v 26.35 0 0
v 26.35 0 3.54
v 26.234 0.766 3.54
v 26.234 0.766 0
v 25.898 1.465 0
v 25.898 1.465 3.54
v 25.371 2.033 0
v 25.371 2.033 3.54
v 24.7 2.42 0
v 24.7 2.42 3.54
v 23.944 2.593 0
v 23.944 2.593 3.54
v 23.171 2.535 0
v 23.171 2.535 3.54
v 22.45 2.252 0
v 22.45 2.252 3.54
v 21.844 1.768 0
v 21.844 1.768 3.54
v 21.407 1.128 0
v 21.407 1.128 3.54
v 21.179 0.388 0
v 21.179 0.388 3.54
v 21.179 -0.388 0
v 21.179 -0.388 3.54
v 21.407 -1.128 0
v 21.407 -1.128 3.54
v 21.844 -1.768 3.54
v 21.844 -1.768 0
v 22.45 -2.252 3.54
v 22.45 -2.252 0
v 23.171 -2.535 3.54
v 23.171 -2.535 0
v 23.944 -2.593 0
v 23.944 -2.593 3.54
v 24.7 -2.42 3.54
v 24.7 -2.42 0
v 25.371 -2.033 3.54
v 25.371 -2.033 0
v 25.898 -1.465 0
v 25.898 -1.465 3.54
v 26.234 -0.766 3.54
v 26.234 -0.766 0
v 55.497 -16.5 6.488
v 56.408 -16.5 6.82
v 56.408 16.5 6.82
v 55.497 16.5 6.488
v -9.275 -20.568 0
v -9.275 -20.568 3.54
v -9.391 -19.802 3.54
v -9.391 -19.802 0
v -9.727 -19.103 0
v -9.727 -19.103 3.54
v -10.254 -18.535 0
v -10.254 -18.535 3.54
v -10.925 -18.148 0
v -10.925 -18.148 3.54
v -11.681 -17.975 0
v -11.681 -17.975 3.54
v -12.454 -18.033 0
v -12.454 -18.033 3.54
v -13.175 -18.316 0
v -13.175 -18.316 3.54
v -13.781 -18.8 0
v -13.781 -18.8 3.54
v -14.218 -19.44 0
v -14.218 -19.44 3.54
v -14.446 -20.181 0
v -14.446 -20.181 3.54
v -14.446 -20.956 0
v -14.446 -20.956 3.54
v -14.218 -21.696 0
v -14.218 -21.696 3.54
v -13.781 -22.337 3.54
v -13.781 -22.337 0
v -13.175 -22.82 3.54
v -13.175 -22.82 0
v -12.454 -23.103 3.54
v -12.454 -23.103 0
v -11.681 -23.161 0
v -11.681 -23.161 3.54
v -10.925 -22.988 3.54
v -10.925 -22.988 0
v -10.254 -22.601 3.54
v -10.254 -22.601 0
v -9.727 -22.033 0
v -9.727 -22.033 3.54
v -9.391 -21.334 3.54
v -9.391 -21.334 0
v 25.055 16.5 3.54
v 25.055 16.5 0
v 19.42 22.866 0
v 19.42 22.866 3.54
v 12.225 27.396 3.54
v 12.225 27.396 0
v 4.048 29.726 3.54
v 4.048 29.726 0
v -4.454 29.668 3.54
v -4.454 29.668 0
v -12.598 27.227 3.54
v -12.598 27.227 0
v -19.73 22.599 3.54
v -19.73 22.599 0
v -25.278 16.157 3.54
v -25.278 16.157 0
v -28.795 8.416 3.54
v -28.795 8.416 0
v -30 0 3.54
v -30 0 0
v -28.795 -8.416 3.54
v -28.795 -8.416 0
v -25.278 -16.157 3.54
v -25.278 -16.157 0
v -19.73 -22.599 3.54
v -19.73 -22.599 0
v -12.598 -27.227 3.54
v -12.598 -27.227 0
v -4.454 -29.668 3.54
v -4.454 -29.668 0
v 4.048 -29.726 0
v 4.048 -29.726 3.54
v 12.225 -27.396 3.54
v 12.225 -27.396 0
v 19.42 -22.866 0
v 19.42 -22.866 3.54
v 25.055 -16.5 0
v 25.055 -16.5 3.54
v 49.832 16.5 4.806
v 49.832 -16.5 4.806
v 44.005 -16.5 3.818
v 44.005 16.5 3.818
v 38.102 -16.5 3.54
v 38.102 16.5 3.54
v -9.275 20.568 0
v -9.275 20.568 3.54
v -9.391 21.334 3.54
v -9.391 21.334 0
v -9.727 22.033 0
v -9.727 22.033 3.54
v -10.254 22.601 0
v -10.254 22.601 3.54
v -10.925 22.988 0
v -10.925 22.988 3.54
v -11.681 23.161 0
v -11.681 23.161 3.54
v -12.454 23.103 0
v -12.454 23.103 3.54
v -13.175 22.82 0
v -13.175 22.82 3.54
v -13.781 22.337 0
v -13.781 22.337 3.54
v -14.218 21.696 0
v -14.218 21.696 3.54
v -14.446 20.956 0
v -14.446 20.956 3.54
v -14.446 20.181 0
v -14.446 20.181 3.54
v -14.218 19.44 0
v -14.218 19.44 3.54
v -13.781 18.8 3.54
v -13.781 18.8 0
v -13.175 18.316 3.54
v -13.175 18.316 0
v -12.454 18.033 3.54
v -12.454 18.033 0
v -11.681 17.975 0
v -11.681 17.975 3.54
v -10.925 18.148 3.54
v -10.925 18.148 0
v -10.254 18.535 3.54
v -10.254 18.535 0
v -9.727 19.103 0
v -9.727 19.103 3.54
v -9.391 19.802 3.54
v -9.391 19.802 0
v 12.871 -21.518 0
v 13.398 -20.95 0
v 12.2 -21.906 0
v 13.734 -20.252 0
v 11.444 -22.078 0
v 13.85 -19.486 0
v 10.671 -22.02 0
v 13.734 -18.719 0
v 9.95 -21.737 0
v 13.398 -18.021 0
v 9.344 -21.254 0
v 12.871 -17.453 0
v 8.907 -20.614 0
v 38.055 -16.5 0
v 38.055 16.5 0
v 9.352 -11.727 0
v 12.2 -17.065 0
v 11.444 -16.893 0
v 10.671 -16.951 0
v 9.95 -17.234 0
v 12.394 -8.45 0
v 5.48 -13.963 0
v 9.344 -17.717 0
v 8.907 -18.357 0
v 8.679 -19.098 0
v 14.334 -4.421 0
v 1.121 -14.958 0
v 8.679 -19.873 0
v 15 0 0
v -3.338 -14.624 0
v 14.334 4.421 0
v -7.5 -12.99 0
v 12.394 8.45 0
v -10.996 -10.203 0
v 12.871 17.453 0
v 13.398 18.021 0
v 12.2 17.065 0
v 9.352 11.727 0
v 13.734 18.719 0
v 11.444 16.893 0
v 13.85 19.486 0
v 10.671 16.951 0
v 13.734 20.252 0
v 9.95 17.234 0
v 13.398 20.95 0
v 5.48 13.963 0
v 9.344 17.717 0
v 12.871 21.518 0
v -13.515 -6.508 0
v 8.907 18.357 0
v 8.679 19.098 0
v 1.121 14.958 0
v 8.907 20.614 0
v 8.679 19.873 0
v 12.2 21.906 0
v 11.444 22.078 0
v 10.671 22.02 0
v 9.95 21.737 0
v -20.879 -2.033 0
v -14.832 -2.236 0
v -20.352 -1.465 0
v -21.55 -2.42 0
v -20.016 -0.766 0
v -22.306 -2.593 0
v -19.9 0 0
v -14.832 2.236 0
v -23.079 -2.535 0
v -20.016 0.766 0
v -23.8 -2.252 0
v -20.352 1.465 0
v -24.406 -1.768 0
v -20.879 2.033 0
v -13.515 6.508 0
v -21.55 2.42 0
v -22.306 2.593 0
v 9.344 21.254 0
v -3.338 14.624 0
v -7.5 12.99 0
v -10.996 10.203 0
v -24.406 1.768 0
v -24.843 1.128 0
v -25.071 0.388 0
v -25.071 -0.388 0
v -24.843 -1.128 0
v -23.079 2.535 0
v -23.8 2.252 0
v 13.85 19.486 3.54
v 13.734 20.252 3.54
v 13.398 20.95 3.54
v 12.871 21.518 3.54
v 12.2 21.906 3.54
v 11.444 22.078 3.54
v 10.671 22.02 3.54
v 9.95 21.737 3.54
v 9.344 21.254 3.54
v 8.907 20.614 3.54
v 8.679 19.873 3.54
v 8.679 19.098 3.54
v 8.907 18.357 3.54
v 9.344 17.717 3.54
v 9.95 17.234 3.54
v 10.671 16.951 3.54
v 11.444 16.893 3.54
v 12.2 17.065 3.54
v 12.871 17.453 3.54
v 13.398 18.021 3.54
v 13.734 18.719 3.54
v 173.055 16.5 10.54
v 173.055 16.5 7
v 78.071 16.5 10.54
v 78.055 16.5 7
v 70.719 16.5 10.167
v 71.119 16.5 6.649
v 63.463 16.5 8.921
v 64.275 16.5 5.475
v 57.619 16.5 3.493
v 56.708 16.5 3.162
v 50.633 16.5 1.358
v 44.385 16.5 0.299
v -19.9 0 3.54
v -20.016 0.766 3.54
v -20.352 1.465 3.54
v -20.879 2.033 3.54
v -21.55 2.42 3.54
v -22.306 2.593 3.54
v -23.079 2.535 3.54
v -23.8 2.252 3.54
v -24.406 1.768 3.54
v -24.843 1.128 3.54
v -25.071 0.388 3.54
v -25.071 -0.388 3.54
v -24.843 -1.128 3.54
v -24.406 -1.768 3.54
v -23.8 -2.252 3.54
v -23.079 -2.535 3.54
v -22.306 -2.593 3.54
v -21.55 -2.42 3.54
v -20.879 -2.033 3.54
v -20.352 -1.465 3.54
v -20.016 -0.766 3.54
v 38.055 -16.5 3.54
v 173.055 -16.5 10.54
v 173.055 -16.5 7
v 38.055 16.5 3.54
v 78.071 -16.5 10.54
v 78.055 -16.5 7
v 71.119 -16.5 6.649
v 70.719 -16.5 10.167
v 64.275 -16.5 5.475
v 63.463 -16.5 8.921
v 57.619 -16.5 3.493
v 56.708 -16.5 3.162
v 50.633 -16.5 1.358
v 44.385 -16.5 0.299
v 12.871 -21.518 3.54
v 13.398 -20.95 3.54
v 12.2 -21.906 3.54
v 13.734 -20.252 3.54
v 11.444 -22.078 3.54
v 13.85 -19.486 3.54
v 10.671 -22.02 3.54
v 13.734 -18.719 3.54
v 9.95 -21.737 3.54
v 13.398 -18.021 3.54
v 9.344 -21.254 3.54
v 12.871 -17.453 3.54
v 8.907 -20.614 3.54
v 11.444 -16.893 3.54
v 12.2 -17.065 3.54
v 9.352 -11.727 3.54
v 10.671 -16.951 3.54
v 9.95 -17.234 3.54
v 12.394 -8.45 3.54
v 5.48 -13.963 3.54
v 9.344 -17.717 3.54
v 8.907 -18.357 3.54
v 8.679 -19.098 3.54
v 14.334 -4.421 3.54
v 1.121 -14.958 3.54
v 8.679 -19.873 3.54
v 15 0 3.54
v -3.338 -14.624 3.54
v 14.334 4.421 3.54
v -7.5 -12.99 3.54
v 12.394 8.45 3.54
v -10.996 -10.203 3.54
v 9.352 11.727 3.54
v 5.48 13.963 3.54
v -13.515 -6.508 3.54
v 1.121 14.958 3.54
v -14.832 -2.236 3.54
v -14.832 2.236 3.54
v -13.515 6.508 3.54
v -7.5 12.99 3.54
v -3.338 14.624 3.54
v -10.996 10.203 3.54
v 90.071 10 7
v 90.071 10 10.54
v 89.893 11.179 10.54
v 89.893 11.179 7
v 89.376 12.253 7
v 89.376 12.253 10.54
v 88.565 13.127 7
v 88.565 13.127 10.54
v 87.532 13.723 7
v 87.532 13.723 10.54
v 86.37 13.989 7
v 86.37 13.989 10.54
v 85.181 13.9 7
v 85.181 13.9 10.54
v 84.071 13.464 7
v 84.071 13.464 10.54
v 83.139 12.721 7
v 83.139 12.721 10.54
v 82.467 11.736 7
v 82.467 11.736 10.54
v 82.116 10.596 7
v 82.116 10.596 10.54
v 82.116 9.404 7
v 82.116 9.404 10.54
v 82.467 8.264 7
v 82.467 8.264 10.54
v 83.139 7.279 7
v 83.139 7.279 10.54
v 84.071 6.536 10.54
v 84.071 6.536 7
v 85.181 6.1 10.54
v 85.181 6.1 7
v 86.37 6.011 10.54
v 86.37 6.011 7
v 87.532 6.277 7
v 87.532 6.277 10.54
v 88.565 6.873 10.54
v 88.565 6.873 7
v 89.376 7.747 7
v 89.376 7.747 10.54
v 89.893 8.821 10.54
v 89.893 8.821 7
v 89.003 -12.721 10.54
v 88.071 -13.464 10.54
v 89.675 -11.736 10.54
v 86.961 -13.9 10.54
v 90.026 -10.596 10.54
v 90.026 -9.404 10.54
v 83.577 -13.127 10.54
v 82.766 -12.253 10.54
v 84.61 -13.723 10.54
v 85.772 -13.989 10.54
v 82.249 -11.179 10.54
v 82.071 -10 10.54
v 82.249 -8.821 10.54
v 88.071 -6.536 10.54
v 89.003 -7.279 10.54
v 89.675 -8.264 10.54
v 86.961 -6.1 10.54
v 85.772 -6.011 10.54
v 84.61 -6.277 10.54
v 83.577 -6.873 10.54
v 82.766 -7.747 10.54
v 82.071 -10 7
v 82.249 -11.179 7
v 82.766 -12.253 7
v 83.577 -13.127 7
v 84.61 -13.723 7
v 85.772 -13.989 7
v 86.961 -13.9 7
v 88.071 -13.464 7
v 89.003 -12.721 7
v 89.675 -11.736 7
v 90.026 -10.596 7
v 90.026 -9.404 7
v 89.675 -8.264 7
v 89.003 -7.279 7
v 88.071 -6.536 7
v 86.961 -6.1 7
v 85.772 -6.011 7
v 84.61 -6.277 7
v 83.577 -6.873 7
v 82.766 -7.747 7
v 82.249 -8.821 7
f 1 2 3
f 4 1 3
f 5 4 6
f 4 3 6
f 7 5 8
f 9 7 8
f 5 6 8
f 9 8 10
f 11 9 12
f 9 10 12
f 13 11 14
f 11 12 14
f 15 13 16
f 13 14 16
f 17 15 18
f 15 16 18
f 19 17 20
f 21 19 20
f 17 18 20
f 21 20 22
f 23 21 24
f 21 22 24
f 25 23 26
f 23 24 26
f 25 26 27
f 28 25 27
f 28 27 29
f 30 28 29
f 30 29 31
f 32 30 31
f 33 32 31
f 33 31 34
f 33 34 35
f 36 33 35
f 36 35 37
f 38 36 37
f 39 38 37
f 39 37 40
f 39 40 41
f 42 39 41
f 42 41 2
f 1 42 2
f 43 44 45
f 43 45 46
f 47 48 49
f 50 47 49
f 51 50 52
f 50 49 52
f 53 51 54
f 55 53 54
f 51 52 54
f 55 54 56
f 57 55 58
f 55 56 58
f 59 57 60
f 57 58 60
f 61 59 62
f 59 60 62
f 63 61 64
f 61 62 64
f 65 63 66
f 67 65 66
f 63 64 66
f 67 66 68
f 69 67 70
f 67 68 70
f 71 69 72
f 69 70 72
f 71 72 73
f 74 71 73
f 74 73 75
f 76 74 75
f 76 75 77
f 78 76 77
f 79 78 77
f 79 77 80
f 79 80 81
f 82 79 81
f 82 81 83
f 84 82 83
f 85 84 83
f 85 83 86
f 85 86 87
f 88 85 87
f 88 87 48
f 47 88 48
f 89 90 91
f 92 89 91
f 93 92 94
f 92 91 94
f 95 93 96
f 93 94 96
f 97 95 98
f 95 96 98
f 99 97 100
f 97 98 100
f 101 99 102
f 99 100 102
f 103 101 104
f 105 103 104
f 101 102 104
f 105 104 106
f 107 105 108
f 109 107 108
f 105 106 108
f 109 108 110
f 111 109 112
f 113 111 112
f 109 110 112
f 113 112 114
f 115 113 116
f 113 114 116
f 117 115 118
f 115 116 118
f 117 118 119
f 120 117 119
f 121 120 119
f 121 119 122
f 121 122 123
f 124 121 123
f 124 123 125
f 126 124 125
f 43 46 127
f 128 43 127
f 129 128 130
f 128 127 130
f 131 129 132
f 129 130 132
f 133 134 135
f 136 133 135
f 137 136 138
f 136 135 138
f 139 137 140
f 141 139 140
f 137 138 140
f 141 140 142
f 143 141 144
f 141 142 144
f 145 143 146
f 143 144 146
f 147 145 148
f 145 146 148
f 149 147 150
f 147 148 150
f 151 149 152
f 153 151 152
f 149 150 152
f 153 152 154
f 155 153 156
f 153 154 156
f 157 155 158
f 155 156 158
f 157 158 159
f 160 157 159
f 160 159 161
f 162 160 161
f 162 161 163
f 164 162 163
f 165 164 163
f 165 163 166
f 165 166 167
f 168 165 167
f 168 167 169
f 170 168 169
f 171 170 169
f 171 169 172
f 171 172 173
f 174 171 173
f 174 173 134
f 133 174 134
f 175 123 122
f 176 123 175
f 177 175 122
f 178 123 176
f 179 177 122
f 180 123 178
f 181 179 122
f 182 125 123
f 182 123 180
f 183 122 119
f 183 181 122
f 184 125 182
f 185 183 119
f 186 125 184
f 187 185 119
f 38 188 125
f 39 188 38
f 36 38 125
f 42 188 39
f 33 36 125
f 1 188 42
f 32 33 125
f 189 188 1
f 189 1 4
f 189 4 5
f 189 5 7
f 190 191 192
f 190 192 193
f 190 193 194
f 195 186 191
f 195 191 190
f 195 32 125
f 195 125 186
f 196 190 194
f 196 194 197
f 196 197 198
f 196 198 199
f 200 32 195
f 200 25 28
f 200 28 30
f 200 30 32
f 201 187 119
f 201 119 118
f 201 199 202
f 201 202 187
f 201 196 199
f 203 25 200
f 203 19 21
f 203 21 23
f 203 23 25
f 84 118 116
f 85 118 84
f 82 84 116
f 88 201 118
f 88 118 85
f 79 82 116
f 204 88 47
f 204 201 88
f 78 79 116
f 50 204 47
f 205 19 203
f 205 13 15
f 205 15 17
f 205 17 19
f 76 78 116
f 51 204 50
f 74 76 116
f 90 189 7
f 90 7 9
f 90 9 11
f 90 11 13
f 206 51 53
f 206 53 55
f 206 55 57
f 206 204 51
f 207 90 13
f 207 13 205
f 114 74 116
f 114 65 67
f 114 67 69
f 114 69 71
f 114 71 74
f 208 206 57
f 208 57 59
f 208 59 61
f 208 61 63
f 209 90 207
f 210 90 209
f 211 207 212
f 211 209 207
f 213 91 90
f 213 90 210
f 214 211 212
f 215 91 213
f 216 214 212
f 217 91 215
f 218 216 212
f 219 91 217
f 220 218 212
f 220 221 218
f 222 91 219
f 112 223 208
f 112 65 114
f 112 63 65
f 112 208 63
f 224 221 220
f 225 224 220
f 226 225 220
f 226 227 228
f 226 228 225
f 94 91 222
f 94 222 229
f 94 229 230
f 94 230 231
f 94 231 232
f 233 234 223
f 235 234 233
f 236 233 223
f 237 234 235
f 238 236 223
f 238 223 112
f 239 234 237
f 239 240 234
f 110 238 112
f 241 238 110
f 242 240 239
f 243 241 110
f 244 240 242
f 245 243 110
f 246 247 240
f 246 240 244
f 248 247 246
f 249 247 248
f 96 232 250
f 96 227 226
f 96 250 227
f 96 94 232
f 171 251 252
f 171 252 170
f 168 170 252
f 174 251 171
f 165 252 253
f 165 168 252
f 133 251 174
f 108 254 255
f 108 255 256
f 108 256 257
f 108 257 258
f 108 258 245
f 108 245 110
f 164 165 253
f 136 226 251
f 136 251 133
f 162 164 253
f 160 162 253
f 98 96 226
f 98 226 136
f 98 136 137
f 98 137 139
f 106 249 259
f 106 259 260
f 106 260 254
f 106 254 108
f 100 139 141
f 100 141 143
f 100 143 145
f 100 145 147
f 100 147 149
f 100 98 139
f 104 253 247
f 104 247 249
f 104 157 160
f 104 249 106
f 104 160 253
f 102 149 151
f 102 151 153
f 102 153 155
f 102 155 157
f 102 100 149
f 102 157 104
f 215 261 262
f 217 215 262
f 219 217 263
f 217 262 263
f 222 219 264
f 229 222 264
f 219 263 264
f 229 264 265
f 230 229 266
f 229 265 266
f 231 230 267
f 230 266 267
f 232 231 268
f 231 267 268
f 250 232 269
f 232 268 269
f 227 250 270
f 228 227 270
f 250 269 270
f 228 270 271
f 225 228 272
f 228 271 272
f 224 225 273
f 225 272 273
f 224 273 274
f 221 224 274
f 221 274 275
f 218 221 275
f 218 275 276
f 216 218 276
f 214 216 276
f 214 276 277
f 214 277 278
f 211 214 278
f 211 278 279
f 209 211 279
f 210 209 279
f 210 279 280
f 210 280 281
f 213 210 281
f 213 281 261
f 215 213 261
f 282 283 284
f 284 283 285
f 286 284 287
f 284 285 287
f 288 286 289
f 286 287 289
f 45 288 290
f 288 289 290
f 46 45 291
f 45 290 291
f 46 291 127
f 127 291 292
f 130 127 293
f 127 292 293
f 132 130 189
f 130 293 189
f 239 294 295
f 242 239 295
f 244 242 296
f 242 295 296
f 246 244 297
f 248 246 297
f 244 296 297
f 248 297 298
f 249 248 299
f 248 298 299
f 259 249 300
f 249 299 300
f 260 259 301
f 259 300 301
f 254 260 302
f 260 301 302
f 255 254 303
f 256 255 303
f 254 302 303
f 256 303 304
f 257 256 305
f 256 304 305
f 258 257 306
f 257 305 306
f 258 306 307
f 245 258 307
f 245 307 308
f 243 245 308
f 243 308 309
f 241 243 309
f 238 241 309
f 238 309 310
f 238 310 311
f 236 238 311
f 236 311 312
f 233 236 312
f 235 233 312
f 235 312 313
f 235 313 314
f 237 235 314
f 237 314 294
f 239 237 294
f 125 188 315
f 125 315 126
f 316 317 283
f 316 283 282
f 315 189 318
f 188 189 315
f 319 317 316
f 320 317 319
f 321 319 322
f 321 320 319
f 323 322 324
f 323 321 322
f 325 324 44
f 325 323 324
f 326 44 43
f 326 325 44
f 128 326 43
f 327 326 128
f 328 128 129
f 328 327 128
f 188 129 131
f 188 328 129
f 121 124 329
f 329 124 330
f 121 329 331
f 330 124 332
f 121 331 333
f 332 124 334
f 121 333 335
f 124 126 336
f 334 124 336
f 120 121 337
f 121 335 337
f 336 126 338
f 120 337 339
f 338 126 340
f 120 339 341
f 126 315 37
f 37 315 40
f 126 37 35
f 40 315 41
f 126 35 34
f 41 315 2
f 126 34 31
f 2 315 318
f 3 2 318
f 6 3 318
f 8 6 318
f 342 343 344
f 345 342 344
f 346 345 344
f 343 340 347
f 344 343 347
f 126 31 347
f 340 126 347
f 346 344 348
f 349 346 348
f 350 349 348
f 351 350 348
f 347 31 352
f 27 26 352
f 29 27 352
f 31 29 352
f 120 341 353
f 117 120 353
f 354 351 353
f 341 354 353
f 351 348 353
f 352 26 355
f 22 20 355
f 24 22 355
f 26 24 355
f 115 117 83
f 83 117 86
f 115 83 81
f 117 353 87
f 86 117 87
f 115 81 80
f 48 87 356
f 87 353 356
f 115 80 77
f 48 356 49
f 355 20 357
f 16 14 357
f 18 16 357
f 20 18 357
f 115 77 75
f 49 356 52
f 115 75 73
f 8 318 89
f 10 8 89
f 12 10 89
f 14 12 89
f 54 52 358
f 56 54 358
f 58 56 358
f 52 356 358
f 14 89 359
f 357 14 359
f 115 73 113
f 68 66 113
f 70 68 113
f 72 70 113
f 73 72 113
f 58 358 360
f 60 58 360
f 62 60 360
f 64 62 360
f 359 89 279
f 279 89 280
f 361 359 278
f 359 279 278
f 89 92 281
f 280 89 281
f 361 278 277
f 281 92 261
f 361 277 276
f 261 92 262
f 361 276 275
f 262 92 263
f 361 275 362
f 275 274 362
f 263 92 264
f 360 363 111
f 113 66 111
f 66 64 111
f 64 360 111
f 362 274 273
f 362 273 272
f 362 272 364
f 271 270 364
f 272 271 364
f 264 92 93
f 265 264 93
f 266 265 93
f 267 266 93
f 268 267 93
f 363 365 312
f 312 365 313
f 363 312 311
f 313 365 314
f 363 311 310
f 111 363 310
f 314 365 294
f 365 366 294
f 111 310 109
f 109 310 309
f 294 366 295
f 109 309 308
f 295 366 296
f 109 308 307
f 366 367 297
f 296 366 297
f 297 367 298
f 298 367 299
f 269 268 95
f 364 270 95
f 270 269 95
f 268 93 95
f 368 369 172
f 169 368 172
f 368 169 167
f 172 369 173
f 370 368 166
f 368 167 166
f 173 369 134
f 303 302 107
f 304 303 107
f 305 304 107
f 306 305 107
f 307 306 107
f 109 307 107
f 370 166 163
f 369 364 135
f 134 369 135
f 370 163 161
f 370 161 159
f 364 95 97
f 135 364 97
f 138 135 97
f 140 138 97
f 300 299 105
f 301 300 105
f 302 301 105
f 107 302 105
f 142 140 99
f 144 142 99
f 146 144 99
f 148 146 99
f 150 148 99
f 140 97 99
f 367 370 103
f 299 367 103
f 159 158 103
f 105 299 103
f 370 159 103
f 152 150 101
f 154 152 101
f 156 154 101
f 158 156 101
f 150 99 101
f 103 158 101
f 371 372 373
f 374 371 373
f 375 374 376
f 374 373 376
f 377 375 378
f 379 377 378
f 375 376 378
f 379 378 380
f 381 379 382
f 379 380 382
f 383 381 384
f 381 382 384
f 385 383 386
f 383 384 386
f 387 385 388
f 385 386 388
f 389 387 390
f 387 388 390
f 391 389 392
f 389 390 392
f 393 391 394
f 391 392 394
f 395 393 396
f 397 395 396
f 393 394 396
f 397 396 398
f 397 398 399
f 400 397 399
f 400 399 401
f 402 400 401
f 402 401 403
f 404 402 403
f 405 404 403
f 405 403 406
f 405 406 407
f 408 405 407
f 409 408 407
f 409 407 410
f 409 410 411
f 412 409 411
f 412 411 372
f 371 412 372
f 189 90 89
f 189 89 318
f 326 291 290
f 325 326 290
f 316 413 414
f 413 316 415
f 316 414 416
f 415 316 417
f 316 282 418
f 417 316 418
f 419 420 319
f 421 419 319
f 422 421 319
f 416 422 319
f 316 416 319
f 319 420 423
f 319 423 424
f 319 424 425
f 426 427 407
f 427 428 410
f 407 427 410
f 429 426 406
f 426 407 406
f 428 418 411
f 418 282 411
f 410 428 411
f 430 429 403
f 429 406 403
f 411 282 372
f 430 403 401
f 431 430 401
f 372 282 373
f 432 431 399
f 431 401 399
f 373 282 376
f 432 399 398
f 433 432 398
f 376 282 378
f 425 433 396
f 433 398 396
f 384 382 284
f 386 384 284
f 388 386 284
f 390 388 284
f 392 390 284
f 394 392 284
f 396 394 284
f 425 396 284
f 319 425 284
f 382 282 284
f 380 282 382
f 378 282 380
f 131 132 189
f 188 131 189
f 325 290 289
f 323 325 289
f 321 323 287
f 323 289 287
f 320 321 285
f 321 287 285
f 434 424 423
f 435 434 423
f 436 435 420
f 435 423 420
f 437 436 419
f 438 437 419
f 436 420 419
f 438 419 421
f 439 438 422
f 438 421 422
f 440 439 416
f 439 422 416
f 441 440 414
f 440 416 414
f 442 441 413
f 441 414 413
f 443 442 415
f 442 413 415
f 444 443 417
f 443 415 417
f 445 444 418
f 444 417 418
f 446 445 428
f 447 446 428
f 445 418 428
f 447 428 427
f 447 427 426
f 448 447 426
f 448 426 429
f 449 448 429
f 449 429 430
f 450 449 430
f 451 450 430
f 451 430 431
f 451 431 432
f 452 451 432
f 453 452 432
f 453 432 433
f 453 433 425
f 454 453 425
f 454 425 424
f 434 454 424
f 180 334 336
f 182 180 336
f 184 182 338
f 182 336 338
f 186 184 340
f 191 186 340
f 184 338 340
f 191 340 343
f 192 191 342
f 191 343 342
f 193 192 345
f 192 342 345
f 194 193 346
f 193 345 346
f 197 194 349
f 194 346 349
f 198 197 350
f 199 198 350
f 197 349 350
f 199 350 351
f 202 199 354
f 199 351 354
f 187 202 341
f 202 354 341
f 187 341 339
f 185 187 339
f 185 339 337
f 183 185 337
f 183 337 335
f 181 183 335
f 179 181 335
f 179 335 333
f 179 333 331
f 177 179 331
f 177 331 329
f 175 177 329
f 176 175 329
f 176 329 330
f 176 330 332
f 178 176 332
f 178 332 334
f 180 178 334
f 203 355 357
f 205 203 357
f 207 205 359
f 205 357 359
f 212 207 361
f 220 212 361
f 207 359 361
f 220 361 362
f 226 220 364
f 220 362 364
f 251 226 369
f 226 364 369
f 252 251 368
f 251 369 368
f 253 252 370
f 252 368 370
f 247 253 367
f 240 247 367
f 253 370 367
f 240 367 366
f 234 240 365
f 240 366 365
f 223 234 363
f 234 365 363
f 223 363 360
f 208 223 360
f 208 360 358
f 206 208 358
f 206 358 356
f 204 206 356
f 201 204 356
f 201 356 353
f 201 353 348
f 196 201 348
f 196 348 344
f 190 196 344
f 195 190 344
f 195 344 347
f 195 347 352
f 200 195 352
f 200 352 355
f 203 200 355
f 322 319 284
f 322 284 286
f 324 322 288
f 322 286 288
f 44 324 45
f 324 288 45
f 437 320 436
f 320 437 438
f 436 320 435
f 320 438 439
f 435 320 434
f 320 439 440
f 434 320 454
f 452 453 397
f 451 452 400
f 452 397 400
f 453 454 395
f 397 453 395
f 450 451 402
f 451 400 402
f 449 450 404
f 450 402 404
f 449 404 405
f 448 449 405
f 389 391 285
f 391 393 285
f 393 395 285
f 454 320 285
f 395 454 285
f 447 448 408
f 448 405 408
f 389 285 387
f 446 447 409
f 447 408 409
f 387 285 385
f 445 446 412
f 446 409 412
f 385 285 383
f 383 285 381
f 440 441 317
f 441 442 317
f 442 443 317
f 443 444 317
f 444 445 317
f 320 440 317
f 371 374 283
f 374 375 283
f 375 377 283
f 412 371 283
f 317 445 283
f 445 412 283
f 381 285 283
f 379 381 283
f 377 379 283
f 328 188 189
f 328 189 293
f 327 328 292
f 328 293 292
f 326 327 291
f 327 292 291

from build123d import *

# Parameters (mm, degrees)
SKETCH1_R           = 30
BOSS_EXTRUDE1_DEPTH = 3.54
BOSS_EXTRUDE4_START = -3.54
BOSS_EXTRUDE4_DEPTH = 3.54
CUT_EXTRUDE1_REACH  = 50.587
SKETCH5_R           = 15
CUT_EXTRUDE2_REACH  = 50.587
SKETCH6_R           = 2.6
BOSS_EXTRUDE5_DEPTH = 33
SKETCH8_R           = 4
CUT_EXTRUDE3_DEPTH  = 10


with BuildPart() as part:
    # Sketch1 → Boss-Extrude1 (new body)
    with BuildSketch(Plane.XY):
        Circle(SKETCH1_R)
    extrude(amount=BOSS_EXTRUDE1_DEPTH)

    # Sketch4 → Boss-Extrude4 (add)
    with BuildSketch(Plane.XY.offset(3.54).offset(BOSS_EXTRUDE4_START)):
        with BuildLine():
            Line((25.054939633, 16.5), (38.054939633, 16.5))
            Line((38.054939633, 16.5), (38.054939633, -16.5))
            Line((38.054939633, -16.5), (25.054939633, -16.5))
            ThreePointArc((25.054939633, -16.5), (30, 0), (25.054939633, 16.5))
        make_face()
    extrude(amount=BOSS_EXTRUDE4_DEPTH)

    # Sketch5 → Cut-Extrude1 (cut, up to next)
    with BuildSketch(Plane.XY.offset(3.54), mode=Mode.PRIVATE) as cut_extrude1_sk1:
        Circle(SKETCH5_R)
    cut_extrude1_tool1 = extrude(cut_extrude1_sk1.sketch, amount=-CUT_EXTRUDE1_REACH, mode=Mode.PRIVATE) & part.part
    add(cut_extrude1_tool1.solids().sort_by_distance((0, 0, 3.54))[0], mode=Mode.SUBTRACT)

    # Sketch6 → Cut-Extrude2 (cut, up to next)
    with BuildSketch(Plane.XY.offset(3.54), mode=Mode.PRIVATE) as cut_extrude2_sk1:
        with Locations((-22.5, 0)):
            Circle(SKETCH6_R)
    cut_extrude2_tool1 = extrude(cut_extrude2_sk1.sketch, amount=-CUT_EXTRUDE2_REACH, mode=Mode.PRIVATE) & part.part
    # Sketch6 → Cut-Extrude2 (cut, up to next)
    with BuildSketch(Plane.XY.offset(3.54), mode=Mode.PRIVATE) as cut_extrude2_sk2:
        with Locations((11.25, 19.485571585)):
            Circle(SKETCH6_R)
    cut_extrude2_tool2 = extrude(cut_extrude2_sk2.sketch, amount=-CUT_EXTRUDE2_REACH, mode=Mode.PRIVATE) & part.part
    # Sketch6 → Cut-Extrude2 (cut, up to next)
    with BuildSketch(Plane.XY.offset(3.54), mode=Mode.PRIVATE) as cut_extrude2_sk3:
        with Locations((11.25, -19.485571585)):
            Circle(SKETCH6_R)
    cut_extrude2_tool3 = extrude(cut_extrude2_sk3.sketch, amount=-CUT_EXTRUDE2_REACH, mode=Mode.PRIVATE) & part.part
    # Sketch6 → Cut-Extrude2 (cut, up to next)
    with BuildSketch(Plane.XY.offset(3.54), mode=Mode.PRIVATE) as cut_extrude2_sk4:
        with Locations((23.75, 0)):
            Circle(SKETCH6_R)
    cut_extrude2_tool4 = extrude(cut_extrude2_sk4.sketch, amount=-CUT_EXTRUDE2_REACH, mode=Mode.PRIVATE) & part.part
    # Sketch6 → Cut-Extrude2 (cut, up to next)
    with BuildSketch(Plane.XY.offset(3.54), mode=Mode.PRIVATE) as cut_extrude2_sk5:
        with Locations((-11.875, -20.56810334)):
            Circle(SKETCH6_R)
    cut_extrude2_tool5 = extrude(cut_extrude2_sk5.sketch, amount=-CUT_EXTRUDE2_REACH, mode=Mode.PRIVATE) & part.part
    # Sketch6 → Cut-Extrude2 (cut, up to next)
    with BuildSketch(Plane.XY.offset(3.54), mode=Mode.PRIVATE) as cut_extrude2_sk6:
        with Locations((-11.875, 20.56810334)):
            Circle(SKETCH6_R)
    cut_extrude2_tool6 = extrude(cut_extrude2_sk6.sketch, amount=-CUT_EXTRUDE2_REACH, mode=Mode.PRIVATE) & part.part
    add(cut_extrude2_tool1.solids().sort_by_distance((-22.5, 0, 3.54))[0], mode=Mode.SUBTRACT)
    add(cut_extrude2_tool2.solids().sort_by_distance((11.25, 19.485572, 3.54))[0], mode=Mode.SUBTRACT)
    add(cut_extrude2_tool3.solids().sort_by_distance((11.25, -19.485572, 3.54))[0], mode=Mode.SUBTRACT)
    add(cut_extrude2_tool4.solids().sort_by_distance((23.75, 0, 3.54))[0], mode=Mode.SUBTRACT)
    add(cut_extrude2_tool5.solids().sort_by_distance((-11.875, -20.568103, 3.54))[0], mode=Mode.SUBTRACT)
    add(cut_extrude2_tool6.solids().sort_by_distance((-11.875, 20.568103, 3.54))[0], mode=Mode.SUBTRACT)


with BuildPart() as body_2:
    # Sketch7 → Boss-Extrude5 (new body)
    with BuildSketch(Plane(origin=(0, 16.5, 0), x_dir=(1, 0, 0), z_dir=(0, 1, 0))):
        with BuildLine():
            Line((78.054939633, -7), (173.054939633, -7))
            Line((173.054939633, -7), (173.054939633, -10.54))
            Line((173.054939633, -10.54), (78.070990419, -10.54))
            ThreePointArc((78.070990419, -10.54), (67.072567905, -9.651997942), (56.407983509, -6.819951839))
            Line((56.407983509, -6.819951839), (55.496978315, -6.488373065))
            ThreePointArc((55.496978315, -6.488373065), (46.933290058, -4.224083077), (38.101791219, -3.539689948))
            Line((38.101791219, -3.539689948), (38.054939633, 0))
            ThreePointArc((38.054939633, 0), (47.524920739, -0.733872032), (56.707729622, -3.161861188))
            Line((56.707729622, -3.161861188), (57.618734817, -3.493439962))
            ThreePointArc((57.618734817, -3.493439962), (67.679379066, -6.164384916), (78.054939633, -7))
        make_face()
    extrude(amount=-BOSS_EXTRUDE5_DEPTH)

    # Sketch8 → Cut-Extrude3 (cut)
    with BuildSketch(Plane.XY.offset(10.54)):
        with Locations((86.070990419, 10)):
            Circle(SKETCH8_R)
        with Locations(Location((86.070990419, -10, 0), (0, 0, 180))):
            Circle(SKETCH8_R)
    extrude(amount=-CUT_EXTRUDE3_DEPTH, mode=Mode.SUBTRACT)


solid = Compound([part.part, body_2.part])
